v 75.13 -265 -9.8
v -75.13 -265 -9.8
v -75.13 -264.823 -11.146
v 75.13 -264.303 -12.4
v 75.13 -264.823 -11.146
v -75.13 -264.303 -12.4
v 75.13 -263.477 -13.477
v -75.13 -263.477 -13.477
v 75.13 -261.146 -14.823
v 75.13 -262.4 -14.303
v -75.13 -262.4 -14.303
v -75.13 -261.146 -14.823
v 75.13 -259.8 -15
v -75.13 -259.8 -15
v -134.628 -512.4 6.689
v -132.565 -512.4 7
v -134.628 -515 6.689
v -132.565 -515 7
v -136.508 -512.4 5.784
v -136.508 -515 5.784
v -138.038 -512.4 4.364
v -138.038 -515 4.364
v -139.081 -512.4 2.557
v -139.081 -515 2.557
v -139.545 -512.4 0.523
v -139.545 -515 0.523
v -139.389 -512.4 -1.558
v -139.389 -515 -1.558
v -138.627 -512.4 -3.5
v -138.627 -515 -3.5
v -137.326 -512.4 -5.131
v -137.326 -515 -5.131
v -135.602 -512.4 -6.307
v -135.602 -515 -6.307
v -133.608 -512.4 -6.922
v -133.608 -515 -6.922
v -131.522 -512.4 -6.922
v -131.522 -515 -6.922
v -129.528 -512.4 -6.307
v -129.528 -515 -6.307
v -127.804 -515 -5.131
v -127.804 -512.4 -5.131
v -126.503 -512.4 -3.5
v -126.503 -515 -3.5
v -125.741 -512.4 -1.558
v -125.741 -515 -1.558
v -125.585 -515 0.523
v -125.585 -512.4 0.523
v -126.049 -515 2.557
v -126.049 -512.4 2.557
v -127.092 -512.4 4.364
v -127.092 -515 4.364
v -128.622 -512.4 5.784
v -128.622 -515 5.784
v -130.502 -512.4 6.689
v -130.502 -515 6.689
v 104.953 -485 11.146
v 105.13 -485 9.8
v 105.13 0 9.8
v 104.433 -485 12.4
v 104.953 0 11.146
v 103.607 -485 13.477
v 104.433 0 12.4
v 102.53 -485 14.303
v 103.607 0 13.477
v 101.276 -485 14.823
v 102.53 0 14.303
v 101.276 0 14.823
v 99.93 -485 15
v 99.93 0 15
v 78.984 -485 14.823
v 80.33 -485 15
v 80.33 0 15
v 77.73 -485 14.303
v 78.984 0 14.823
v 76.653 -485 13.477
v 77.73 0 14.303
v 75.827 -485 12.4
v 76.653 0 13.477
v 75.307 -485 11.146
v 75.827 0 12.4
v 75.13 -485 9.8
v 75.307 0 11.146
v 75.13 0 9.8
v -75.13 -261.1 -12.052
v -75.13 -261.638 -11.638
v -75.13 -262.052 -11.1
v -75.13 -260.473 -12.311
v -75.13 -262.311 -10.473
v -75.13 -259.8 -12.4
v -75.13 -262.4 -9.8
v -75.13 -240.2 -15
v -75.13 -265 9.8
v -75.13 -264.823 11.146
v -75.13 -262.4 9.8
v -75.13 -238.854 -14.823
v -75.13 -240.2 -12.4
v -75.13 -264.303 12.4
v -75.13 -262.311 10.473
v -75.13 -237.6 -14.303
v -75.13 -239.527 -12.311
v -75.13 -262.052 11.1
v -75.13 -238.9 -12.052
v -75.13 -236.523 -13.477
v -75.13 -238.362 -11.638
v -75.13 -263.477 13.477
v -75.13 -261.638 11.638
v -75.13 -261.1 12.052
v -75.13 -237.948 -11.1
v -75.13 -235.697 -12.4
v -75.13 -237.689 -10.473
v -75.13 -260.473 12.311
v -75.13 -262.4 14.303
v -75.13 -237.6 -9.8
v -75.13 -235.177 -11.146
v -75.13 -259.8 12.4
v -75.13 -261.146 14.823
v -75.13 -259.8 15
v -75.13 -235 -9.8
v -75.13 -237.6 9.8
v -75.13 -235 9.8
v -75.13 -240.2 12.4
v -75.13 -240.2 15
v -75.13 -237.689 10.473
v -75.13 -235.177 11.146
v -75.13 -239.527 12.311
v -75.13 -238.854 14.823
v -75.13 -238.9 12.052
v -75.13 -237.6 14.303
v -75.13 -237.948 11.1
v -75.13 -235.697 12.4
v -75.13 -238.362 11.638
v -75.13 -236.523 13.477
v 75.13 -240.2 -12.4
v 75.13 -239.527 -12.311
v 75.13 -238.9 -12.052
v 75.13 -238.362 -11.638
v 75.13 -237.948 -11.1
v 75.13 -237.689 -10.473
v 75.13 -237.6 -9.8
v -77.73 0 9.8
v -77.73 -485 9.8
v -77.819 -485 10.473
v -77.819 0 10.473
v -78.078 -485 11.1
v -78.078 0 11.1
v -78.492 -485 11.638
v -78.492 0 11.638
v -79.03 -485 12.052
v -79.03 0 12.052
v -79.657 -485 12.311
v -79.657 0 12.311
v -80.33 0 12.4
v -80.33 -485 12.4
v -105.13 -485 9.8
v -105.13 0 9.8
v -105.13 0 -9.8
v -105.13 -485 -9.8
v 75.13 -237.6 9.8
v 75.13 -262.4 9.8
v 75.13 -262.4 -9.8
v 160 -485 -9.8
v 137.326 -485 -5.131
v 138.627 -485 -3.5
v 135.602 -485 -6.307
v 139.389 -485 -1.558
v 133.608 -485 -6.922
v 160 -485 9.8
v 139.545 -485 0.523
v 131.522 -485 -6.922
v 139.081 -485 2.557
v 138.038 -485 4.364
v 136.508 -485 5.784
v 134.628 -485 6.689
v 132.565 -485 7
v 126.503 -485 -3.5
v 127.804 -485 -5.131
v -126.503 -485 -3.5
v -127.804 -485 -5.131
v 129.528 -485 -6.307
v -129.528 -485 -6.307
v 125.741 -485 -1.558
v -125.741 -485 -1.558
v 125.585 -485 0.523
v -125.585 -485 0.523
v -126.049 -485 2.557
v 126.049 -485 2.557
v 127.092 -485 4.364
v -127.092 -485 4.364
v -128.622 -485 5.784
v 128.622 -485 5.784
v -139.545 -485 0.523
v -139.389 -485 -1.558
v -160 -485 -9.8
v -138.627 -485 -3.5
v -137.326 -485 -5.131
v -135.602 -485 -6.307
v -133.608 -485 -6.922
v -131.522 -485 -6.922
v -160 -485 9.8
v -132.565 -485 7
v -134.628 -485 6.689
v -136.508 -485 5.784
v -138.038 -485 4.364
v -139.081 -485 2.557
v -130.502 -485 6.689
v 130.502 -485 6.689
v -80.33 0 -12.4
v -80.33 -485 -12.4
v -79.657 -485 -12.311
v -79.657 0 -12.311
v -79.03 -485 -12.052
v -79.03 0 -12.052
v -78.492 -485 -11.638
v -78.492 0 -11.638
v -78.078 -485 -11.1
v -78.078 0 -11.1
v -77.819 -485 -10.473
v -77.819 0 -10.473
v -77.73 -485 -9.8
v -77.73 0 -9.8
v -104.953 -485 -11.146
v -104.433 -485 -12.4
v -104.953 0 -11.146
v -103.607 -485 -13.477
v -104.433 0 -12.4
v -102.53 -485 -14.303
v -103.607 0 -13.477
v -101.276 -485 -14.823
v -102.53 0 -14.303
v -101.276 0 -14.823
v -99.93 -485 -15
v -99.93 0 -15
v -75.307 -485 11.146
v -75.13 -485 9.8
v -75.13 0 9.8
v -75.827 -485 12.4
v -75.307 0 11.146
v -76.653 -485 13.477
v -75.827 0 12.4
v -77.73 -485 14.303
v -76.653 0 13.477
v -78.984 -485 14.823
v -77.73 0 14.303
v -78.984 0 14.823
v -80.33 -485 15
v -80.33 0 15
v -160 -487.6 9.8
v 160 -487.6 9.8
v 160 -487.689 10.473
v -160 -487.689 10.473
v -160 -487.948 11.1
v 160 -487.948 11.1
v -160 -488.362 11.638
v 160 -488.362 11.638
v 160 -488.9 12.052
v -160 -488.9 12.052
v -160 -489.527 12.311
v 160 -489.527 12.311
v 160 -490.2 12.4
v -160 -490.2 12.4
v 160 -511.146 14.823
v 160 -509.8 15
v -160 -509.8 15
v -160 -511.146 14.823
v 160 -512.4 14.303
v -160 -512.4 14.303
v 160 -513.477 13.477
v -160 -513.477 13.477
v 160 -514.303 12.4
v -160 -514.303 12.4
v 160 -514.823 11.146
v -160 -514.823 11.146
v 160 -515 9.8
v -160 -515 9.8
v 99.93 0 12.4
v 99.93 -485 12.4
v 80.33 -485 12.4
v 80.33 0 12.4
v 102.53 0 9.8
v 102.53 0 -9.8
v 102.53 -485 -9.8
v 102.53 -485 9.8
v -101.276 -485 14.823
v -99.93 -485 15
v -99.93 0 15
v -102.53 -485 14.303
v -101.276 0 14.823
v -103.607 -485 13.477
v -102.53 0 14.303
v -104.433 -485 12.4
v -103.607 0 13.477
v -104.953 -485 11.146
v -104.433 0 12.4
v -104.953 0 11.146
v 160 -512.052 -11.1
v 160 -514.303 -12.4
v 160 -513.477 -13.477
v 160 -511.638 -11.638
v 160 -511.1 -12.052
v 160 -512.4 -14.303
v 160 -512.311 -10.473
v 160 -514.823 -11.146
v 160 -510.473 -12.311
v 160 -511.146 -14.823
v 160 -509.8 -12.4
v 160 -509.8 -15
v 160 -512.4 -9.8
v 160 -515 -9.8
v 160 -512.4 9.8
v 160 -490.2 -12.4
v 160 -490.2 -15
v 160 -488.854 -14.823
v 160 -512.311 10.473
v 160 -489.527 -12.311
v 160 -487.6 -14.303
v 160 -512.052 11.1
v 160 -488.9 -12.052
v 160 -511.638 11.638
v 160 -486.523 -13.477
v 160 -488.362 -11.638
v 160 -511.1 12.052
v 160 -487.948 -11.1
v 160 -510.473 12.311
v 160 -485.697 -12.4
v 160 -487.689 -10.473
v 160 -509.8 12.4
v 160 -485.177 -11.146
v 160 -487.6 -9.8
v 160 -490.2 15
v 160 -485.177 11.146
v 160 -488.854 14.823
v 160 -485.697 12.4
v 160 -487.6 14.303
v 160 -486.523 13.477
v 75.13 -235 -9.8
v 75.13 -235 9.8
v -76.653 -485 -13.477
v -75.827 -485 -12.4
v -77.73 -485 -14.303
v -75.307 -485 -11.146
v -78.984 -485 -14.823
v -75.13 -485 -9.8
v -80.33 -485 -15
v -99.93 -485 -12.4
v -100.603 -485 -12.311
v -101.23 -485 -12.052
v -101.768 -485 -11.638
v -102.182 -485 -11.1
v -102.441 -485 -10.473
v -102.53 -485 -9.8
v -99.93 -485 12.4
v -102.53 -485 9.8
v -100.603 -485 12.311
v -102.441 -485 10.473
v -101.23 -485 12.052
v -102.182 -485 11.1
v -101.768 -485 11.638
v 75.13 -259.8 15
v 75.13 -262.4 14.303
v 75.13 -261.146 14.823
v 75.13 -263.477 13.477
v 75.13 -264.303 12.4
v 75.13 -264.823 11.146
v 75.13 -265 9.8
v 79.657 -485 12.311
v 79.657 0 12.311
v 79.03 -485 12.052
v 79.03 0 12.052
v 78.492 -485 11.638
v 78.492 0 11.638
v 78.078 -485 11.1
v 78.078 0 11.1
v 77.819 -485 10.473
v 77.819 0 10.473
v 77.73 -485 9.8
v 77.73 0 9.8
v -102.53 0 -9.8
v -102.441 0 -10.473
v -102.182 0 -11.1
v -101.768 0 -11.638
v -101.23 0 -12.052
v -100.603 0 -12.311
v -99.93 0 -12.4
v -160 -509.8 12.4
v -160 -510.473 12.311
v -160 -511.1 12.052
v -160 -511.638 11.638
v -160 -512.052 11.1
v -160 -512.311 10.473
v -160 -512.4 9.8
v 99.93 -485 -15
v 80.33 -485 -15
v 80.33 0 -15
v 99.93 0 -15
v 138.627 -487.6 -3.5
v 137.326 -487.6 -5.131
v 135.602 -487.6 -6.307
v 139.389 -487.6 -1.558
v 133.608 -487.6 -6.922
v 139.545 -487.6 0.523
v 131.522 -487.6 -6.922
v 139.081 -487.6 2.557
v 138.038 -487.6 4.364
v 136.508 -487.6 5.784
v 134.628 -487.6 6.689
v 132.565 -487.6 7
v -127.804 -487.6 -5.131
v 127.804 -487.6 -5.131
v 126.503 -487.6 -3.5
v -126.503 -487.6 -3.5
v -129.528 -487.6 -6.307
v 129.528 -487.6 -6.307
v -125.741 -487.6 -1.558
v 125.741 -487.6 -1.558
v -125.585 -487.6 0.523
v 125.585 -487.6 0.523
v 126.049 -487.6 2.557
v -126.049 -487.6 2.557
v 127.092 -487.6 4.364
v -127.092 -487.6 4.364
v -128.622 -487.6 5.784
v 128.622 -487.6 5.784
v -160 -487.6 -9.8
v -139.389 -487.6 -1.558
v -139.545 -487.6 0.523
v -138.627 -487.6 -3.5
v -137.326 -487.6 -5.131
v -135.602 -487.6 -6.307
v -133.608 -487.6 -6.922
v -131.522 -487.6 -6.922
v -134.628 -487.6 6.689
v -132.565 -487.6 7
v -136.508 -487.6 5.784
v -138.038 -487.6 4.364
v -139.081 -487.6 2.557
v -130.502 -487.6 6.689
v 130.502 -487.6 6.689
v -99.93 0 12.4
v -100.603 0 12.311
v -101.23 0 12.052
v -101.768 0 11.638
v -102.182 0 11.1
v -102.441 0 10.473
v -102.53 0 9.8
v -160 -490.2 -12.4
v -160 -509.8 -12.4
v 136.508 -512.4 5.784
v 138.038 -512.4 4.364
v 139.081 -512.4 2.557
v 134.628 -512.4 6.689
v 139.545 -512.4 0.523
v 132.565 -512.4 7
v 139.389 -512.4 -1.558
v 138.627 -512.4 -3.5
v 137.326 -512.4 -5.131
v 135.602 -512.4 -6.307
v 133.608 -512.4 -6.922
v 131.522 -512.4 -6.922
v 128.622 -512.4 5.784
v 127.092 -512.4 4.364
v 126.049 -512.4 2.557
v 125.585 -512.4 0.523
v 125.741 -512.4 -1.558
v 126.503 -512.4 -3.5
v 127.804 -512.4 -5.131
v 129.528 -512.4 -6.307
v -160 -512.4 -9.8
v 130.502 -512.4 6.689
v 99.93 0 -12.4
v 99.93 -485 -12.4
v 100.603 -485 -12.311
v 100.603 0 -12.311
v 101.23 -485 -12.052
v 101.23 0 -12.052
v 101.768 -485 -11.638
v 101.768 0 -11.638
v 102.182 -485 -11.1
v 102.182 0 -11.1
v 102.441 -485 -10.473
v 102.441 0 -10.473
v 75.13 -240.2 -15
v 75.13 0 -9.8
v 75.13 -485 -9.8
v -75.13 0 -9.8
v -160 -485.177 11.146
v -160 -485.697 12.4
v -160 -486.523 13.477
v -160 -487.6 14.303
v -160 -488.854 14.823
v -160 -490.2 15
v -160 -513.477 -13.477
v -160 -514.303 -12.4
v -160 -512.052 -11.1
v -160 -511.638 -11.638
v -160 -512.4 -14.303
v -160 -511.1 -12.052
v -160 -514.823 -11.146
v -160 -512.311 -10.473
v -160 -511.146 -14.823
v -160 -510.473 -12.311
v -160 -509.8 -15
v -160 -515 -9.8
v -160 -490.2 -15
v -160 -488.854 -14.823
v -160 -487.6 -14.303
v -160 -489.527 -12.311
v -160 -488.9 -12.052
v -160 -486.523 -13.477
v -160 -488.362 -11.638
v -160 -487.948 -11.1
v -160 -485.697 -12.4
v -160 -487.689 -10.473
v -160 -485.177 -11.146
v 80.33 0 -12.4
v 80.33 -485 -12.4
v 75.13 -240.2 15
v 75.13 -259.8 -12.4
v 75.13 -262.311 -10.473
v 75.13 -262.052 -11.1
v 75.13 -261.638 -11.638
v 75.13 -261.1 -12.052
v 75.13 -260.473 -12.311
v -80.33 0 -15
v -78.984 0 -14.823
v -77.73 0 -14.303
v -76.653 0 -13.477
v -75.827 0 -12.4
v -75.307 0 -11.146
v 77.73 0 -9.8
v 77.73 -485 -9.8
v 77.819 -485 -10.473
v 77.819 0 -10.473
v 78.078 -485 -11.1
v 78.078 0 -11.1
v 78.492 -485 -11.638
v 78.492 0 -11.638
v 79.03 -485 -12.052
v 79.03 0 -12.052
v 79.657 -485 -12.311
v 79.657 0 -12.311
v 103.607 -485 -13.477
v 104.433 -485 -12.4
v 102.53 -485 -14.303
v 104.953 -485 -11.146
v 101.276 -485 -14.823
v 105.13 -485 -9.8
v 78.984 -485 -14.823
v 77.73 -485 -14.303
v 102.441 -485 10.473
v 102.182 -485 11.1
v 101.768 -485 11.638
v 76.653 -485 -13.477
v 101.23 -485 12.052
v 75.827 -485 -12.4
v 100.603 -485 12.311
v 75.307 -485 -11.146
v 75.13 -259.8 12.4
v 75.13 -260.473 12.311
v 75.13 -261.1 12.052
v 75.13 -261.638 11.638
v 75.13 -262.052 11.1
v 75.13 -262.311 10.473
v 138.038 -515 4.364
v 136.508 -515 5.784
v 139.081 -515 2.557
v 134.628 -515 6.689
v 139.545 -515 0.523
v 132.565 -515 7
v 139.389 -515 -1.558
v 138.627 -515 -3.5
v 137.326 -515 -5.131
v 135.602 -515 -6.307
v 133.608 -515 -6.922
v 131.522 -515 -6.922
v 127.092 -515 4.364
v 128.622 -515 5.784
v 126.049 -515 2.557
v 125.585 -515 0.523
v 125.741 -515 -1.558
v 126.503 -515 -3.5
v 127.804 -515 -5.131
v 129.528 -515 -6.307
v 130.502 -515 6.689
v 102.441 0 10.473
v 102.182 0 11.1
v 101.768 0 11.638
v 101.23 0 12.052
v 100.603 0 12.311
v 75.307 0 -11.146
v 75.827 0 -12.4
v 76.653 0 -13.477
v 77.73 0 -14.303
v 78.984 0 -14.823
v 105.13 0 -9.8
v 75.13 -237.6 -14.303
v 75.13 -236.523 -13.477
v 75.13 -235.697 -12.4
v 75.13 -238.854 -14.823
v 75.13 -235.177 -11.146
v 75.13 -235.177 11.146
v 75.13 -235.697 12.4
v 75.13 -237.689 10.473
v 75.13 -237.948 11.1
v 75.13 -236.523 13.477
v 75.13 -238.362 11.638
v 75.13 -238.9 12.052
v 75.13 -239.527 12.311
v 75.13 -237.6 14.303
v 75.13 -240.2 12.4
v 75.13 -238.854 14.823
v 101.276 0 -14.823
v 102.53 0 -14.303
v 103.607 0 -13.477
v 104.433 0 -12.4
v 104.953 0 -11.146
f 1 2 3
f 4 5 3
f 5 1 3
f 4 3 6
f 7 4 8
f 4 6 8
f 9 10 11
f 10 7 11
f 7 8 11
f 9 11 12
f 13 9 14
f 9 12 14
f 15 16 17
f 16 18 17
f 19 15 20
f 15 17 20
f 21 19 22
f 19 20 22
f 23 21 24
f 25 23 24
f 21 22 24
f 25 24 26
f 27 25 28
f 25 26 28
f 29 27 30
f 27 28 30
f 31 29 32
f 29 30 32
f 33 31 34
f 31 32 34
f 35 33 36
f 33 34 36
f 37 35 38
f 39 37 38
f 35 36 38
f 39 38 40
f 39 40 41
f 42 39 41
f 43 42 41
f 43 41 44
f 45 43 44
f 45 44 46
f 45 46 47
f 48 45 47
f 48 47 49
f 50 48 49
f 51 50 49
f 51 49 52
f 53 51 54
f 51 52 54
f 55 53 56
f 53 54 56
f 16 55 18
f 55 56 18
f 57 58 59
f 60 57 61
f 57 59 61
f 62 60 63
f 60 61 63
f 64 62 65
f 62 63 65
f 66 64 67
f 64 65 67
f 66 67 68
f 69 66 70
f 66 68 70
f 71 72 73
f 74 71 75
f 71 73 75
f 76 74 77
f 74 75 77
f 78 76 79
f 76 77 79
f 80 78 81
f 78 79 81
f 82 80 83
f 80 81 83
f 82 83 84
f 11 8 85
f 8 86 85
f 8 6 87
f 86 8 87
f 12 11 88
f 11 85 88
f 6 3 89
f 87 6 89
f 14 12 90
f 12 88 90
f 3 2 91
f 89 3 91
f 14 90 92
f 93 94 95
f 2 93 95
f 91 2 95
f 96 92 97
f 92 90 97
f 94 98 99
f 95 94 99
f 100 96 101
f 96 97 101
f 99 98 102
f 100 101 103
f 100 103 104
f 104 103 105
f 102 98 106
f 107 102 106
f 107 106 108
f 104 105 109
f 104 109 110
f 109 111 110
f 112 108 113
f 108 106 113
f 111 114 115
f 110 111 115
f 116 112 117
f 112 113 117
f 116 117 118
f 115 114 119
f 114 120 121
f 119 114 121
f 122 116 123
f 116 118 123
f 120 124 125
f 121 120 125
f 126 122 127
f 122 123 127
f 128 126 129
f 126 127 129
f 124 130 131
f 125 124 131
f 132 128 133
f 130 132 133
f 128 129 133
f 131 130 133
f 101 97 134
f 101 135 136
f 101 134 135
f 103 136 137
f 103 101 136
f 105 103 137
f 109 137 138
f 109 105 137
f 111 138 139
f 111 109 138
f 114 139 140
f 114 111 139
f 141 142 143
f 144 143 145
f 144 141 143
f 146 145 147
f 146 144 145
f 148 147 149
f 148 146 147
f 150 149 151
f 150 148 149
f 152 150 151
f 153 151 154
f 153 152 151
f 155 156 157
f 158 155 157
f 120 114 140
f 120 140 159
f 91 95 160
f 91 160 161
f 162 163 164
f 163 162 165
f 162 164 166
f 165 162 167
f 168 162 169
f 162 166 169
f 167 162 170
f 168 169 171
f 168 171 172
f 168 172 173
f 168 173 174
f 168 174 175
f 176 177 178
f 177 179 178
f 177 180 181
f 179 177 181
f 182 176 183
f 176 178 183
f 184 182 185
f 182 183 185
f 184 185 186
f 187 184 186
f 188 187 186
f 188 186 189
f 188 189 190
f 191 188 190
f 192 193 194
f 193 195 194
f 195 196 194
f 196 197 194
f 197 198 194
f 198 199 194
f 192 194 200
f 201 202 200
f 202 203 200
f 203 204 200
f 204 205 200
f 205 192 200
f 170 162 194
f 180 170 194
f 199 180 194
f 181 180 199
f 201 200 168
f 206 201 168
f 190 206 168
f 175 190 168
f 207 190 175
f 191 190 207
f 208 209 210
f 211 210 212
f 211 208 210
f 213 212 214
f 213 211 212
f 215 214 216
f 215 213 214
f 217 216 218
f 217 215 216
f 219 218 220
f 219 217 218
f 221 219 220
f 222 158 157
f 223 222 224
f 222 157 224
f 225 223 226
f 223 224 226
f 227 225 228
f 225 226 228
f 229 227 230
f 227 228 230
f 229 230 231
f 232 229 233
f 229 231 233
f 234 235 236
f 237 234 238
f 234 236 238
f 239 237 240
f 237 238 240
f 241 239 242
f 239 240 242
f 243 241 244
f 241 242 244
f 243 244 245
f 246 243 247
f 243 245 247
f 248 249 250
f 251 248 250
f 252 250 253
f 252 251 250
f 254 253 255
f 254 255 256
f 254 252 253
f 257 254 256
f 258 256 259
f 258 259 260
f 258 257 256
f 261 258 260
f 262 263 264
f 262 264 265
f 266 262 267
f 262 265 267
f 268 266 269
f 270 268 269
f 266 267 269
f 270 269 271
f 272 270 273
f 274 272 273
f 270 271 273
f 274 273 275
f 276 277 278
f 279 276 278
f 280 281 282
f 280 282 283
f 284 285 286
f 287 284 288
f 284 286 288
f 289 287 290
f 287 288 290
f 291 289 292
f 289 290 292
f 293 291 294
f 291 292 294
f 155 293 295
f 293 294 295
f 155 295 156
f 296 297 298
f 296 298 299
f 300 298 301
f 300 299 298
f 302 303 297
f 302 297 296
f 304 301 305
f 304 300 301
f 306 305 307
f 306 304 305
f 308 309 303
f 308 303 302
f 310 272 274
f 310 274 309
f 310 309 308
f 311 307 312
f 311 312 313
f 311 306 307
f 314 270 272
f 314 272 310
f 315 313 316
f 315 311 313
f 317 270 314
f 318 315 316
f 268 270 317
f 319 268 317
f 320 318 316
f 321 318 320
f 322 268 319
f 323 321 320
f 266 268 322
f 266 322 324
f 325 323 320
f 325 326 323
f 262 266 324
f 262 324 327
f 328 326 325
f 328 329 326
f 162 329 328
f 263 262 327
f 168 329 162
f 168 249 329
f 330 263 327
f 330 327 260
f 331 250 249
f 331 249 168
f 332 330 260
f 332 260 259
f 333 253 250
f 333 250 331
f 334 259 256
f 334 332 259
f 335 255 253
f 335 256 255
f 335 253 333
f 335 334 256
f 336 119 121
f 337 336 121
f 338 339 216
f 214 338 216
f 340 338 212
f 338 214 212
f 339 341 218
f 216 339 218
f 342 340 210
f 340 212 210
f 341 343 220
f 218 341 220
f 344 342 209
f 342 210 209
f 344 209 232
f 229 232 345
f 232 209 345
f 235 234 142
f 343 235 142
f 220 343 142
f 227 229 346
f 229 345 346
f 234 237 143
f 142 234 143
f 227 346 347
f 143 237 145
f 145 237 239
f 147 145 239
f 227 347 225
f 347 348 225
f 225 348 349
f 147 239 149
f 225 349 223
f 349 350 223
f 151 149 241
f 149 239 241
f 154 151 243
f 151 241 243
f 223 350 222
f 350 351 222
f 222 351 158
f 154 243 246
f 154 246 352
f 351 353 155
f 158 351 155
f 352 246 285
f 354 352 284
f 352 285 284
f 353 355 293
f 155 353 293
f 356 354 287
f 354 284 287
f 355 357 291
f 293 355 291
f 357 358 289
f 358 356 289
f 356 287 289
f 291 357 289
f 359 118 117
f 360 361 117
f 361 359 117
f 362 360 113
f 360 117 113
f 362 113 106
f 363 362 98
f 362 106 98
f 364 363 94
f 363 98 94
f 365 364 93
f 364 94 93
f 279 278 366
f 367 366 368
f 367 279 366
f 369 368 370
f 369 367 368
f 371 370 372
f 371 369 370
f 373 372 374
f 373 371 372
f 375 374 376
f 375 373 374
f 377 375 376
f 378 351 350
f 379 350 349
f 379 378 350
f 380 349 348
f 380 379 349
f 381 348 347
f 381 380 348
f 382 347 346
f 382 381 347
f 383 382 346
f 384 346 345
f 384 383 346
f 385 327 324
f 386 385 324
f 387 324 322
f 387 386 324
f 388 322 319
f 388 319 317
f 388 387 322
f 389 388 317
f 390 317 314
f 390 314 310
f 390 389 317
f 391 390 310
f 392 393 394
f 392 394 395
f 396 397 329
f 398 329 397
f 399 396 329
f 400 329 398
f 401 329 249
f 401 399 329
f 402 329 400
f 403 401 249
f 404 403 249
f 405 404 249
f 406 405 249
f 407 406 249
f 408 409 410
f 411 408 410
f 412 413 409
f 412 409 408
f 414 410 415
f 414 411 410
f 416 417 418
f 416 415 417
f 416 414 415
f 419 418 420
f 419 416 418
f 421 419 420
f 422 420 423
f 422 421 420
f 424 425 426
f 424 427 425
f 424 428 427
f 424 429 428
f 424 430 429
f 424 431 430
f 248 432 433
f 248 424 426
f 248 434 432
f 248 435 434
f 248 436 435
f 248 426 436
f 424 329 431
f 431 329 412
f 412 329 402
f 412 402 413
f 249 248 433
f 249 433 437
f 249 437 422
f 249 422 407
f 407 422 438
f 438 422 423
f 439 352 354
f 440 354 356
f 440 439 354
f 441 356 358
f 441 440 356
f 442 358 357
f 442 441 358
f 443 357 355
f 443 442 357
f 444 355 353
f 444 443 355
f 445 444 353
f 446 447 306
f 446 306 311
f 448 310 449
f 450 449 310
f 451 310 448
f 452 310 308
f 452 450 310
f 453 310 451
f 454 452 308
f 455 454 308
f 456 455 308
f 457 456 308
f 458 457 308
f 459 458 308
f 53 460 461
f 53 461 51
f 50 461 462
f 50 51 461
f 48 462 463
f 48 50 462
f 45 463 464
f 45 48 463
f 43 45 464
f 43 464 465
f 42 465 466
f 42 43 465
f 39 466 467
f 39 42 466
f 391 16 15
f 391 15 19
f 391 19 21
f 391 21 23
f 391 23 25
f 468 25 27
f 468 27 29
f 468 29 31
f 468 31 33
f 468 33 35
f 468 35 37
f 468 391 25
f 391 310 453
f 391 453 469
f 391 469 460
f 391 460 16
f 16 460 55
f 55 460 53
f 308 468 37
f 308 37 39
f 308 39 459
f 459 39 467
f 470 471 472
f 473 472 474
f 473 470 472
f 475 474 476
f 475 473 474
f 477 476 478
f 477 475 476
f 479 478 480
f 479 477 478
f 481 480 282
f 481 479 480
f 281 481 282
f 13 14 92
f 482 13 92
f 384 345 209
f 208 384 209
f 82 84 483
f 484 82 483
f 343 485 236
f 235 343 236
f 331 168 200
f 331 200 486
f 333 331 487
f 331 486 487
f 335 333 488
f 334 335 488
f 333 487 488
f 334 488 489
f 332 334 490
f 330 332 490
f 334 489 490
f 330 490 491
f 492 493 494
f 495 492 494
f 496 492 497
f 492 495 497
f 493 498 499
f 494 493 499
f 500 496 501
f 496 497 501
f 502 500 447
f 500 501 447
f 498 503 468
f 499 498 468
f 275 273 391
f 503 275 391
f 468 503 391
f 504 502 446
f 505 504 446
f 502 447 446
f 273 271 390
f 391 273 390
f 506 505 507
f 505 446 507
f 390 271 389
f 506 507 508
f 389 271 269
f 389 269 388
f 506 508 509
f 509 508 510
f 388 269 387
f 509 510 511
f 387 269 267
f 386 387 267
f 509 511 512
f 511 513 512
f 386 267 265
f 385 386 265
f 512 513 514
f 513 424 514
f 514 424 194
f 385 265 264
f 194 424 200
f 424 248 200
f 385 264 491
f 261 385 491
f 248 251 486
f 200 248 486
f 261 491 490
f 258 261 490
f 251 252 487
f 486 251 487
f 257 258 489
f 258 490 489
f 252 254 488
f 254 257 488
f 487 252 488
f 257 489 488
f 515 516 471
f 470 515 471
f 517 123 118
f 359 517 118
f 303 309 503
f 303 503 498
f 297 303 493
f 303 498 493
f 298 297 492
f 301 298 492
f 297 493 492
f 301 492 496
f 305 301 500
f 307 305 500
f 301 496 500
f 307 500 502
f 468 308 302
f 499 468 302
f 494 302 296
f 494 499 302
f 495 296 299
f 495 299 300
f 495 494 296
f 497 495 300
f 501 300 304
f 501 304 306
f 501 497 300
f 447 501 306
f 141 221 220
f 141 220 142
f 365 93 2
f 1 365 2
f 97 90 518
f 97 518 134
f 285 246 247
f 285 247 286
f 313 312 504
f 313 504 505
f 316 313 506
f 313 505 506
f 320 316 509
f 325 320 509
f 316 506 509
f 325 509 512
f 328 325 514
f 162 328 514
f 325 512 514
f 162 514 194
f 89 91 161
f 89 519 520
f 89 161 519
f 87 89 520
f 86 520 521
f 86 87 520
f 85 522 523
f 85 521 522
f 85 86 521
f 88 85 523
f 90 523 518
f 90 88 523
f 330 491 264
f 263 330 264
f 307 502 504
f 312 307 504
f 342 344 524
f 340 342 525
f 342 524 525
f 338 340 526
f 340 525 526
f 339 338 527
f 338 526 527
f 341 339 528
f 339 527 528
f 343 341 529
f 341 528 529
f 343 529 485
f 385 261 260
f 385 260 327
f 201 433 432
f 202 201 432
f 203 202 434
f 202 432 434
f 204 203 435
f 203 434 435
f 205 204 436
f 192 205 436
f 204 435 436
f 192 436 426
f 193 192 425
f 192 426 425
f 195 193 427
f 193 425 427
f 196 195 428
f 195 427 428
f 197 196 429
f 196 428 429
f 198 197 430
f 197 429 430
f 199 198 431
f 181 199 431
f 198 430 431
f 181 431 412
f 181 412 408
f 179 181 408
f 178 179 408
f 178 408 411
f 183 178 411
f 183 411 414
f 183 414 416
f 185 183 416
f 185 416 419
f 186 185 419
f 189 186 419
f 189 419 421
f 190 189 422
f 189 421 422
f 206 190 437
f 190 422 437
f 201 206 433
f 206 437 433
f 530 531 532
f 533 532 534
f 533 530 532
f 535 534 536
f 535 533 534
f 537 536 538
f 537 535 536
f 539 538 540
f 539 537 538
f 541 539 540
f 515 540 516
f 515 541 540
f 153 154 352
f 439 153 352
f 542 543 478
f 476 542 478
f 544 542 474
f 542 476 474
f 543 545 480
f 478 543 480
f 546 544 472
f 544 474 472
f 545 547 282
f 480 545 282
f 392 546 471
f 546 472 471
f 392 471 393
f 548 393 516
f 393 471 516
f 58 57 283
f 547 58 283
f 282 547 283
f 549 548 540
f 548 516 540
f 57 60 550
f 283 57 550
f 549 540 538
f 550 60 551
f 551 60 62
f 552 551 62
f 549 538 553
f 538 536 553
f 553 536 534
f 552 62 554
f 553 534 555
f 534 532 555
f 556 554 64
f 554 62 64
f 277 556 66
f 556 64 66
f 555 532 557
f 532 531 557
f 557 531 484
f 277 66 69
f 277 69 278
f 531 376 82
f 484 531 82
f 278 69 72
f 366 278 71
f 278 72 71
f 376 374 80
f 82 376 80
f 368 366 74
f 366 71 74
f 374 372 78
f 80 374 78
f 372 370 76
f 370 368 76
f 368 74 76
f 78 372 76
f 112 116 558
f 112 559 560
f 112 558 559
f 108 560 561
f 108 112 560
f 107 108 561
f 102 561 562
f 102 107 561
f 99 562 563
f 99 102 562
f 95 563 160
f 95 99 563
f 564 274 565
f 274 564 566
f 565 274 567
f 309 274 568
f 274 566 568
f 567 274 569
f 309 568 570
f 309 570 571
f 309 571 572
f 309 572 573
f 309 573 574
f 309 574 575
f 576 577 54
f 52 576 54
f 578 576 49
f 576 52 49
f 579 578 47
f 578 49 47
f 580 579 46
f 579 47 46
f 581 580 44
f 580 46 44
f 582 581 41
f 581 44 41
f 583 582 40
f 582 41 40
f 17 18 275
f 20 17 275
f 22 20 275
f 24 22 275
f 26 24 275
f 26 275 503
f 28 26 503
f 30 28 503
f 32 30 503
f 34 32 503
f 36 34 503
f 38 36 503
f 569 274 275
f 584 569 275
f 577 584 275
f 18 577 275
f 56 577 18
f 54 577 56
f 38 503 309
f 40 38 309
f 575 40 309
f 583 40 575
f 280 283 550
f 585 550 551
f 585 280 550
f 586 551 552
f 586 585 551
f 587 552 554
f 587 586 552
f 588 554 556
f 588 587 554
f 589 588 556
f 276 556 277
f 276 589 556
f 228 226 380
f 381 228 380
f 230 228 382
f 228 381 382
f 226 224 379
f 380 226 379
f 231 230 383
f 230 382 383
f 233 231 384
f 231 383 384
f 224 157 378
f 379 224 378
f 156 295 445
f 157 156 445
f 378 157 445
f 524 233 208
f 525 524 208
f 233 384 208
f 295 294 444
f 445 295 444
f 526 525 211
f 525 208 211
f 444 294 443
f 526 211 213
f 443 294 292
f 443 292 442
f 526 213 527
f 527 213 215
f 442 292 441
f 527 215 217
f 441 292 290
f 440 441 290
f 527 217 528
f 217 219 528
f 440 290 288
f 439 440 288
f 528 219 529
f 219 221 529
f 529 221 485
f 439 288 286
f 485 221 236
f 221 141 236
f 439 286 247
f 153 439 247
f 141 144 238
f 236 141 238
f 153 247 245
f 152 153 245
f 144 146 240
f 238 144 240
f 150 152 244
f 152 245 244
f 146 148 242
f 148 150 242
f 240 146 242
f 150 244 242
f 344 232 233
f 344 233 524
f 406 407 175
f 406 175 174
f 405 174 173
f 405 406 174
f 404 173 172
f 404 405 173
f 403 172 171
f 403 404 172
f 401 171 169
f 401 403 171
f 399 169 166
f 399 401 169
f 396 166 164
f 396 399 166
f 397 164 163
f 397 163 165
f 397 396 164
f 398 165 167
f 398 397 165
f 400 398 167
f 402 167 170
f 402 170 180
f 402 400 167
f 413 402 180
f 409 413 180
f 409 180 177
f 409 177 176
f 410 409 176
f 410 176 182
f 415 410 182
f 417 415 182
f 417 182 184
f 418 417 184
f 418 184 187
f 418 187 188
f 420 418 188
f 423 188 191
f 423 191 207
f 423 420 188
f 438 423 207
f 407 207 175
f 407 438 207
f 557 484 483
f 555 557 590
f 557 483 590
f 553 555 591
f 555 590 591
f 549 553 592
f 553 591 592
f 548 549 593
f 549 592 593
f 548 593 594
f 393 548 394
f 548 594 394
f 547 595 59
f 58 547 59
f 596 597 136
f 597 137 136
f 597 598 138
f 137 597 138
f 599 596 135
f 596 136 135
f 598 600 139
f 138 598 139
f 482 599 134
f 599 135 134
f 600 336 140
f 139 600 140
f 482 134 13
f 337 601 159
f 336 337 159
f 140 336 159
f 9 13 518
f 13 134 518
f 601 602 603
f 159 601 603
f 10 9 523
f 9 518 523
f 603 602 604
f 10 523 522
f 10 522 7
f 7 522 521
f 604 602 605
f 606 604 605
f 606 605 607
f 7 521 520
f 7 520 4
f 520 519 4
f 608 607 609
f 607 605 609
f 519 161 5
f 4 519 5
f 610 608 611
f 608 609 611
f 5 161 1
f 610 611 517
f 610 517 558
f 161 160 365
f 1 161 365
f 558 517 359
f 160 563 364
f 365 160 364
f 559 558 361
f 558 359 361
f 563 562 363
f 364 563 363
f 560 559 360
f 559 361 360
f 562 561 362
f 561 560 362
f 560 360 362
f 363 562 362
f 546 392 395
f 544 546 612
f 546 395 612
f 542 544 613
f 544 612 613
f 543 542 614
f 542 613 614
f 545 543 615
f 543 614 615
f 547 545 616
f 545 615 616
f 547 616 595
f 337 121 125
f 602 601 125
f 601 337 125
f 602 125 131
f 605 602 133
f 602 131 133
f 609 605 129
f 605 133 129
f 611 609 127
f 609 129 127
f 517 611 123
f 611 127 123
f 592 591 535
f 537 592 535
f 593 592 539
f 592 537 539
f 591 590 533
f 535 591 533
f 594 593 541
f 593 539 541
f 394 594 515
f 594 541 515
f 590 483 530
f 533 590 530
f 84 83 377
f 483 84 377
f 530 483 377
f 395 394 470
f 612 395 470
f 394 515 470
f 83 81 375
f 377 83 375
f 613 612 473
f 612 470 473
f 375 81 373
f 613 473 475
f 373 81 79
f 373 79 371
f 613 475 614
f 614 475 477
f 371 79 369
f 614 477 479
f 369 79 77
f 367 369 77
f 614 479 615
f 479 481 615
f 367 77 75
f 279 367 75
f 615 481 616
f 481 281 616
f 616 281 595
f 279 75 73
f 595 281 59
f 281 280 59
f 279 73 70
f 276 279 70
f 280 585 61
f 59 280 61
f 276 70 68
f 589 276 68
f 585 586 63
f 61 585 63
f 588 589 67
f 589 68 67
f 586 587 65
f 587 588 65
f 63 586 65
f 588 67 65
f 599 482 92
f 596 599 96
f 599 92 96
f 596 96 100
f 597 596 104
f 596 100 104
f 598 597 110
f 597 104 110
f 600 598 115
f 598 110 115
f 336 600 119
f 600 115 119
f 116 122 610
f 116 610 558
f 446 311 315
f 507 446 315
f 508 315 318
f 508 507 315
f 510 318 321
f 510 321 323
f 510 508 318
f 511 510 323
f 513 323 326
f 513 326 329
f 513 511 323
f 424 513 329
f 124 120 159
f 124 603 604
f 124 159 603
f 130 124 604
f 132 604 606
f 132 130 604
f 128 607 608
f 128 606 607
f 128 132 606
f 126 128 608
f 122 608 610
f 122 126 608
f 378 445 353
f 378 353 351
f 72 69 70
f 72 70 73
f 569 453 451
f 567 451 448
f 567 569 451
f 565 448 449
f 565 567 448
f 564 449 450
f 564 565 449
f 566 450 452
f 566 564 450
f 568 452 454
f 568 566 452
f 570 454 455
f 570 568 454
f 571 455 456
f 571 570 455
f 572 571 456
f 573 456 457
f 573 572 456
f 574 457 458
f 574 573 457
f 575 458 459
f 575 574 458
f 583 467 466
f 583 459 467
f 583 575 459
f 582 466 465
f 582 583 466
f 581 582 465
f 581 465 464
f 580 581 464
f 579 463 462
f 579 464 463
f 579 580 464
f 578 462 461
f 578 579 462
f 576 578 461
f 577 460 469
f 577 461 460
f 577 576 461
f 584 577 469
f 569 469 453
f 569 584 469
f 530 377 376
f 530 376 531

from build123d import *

# Parameters (mm, degrees)
SQUARE_TUBE_CONFIGURED_30_X_30_X_2_6_1_DEPTH = 501
SQUARE_TUBE_CONFIGURED_30_X_30_X_2_3_DEPTH   = 501
SQUARE_TUBE_CONFIGURED_30_X_30_X_2_4_DEPTH   = 320
SQUARE_TUBE_CONFIGURED_30_X_30_X_2_5_DEPTH   = 182.26
IZIM9_W                                      = 7
IZIM9_H                                      = 30


with BuildPart() as part:
    # Sketch1 → Square tube - configured 30 X 30 X 2.6(1) (new body)
    with BuildSketch(Plane(origin=(-90.13, 0, 0), x_dir=(1, 0, 0), z_dir=(0, -1, 0))):
        with BuildLine():
            Line((-9.8, -15), (9.8, -15))
            ThreePointArc((9.8, -15), (13.476955262, -13.476955262), (15, -9.8))
            Line((15, -9.8), (15, 9.8))
            ThreePointArc((15, 9.8), (13.476955262, 13.476955262), (9.8, 15))
            Line((9.8, 15), (-9.8, 15))
            ThreePointArc((-9.8, 15), (-13.476955262, 13.476955262), (-15, 9.8))
            Line((-15, 9.8), (-15, -9.8))
            ThreePointArc((-15, -9.8), (-13.476955262, -13.476955262), (-9.8, -15))
        make_face()
        with BuildLine():
            Line((-9.8, -12.4), (9.8, -12.4))
            ThreePointArc((9.8, -12.4), (11.638477631, -11.638477631), (12.4, -9.8))
            Line((12.4, -9.8), (12.4, 9.8))
            ThreePointArc((12.4, 9.8), (11.638477631, 11.638477631), (9.8, 12.4))
            Line((9.8, 12.4), (-9.8, 12.4))
            ThreePointArc((-9.8, 12.4), (-11.638477631, 11.638477631), (-12.4, 9.8))
            Line((-12.4, 9.8), (-12.4, -9.8))
            ThreePointArc((-12.4, -9.8), (-11.638477631, -11.638477631), (-9.8, -12.4))
        make_face(mode=Mode.SUBTRACT)
    extrude(amount=SQUARE_TUBE_CONFIGURED_30_X_30_X_2_6_1_DEPTH)

    # Square tube - configured 30 X 30 X 2 2
    split(bisect_by=Plane(origin=(-90.13, -485, 0), x_dir=(-1, 0, 0), z_dir=(0, 1, 0)), keep=Keep.TOP)


with BuildPart() as body_2:
    # Sketch1 on segment 2 (carried to segment 2) → Square tube - configured 30 X 30 X 2 3 (new body)
    with BuildSketch(Plane(origin=(90.13, 0, 0), x_dir=(1, 0, 0), z_dir=(0, -1, 0))):
        with BuildLine():
            Line((-9.8, -15), (9.8, -15))
            ThreePointArc((9.8, -15), (13.476955262, -13.476955262), (15, -9.8))
            Line((15, -9.8), (15, 9.8))
            ThreePointArc((15, 9.8), (13.476955262, 13.476955262), (9.8, 15))
            Line((9.8, 15), (-9.8, 15))
            ThreePointArc((-9.8, 15), (-13.476955262, 13.476955262), (-15, 9.8))
            Line((-15, 9.8), (-15, -9.8))
            ThreePointArc((-15, -9.8), (-13.476955262, -13.476955262), (-9.8, -15))
        make_face()
        with BuildLine():
            Line((-9.8, -12.4), (9.8, -12.4))
            ThreePointArc((9.8, -12.4), (11.638477631, -11.638477631), (12.4, -9.8))
            Line((12.4, -9.8), (12.4, 9.8))
            ThreePointArc((12.4, 9.8), (11.638477631, 11.638477631), (9.8, 12.4))
            Line((9.8, 12.4), (-9.8, 12.4))
            ThreePointArc((-9.8, 12.4), (-11.638477631, 11.638477631), (-12.4, 9.8))
            Line((-12.4, 9.8), (-12.4, -9.8))
            ThreePointArc((-12.4, -9.8), (-11.638477631, -11.638477631), (-9.8, -12.4))
        make_face(mode=Mode.SUBTRACT)
    extrude(amount=SQUARE_TUBE_CONFIGURED_30_X_30_X_2_3_DEPTH)

    # Square tube - configured 30 X 30 X 2 3 e
    split(bisect_by=Plane(origin=(90.13, -485, 0), x_dir=(-1, 0, 0), z_dir=(0, 1, 0)), keep=Keep.TOP)


with BuildPart() as body_3:
    # Sketch1 on segment 3 (carried to segment 3) → Square tube - configured 30 X 30 X 2 4 (new body)
    with BuildSketch(Plane(origin=(-160, -500, 0), x_dir=(0, 1, 0), z_dir=(1, 0, 0))):
        with BuildLine():
            Line((-9.8, -15), (9.8, -15))
            ThreePointArc((9.8, -15), (13.476955262, -13.476955262), (15, -9.8))
            Line((15, -9.8), (15, 9.8))
            ThreePointArc((15, 9.8), (13.476955262, 13.476955262), (9.8, 15))
            Line((9.8, 15), (-9.8, 15))
            ThreePointArc((-9.8, 15), (-13.476955262, 13.476955262), (-15, 9.8))
            Line((-15, 9.8), (-15, -9.8))
            ThreePointArc((-15, -9.8), (-13.476955262, -13.476955262), (-9.8, -15))
        make_face()
        with BuildLine():
            Line((-9.8, -12.4), (9.8, -12.4))
            ThreePointArc((9.8, -12.4), (11.638477631, -11.638477631), (12.4, -9.8))
            Line((12.4, -9.8), (12.4, 9.8))
            ThreePointArc((12.4, 9.8), (11.638477631, 11.638477631), (9.8, 12.4))
            Line((9.8, 12.4), (-9.8, 12.4))
            ThreePointArc((-9.8, 12.4), (-11.638477631, 11.638477631), (-12.4, 9.8))
            Line((-12.4, 9.8), (-12.4, -9.8))
            ThreePointArc((-12.4, -9.8), (-11.638477631, -11.638477631), (-9.8, -12.4))
        make_face(mode=Mode.SUBTRACT)
    extrude(amount=SQUARE_TUBE_CONFIGURED_30_X_30_X_2_4_DEPTH)

    # Çizim9 → M16 Dişli Delik1 (revolve, cut)
    with BuildSketch(Plane(origin=(-132.565, -485, 0), x_dir=(0, 0, 1), z_dir=(1, 0, 0))):
        with Locations((3.5, 15)):
            Rectangle(IZIM9_W, IZIM9_H)
    m16_di_li_delik1 = revolve(axis=Axis((-132.565, -478.65, 0), (0, -1, 0)), mode=Mode.SUBTRACT)

    # Aynalama1: M16 Dişli Delik1 across plane
    add(m16_di_li_delik1.mirror(Plane(origin=(0, 0, 0), x_dir=(0, 0, 1), z_dir=(1, 0, 0))), mode=Mode.SUBTRACT)


with BuildPart() as body_4:
    # Sketch1 on segment 4 (carried to segment 4) → Square tube - configured 30 X 30 X 2 5 (new body)
    with BuildSketch(Plane(origin=(-91.13, -250, 0), x_dir=(0, 1, 0), z_dir=(1, 0, 0))):
        with BuildLine():
            Line((-9.8, -15), (9.8, -15))
            ThreePointArc((9.8, -15), (13.476955262, -13.476955262), (15, -9.8))
            Line((15, -9.8), (15, 9.8))
            ThreePointArc((15, 9.8), (13.476955262, 13.476955262), (9.8, 15))
            Line((9.8, 15), (-9.8, 15))
            ThreePointArc((-9.8, 15), (-13.476955262, 13.476955262), (-15, 9.8))
            Line((-15, 9.8), (-15, -9.8))
            ThreePointArc((-15, -9.8), (-13.476955262, -13.476955262), (-9.8, -15))
        make_face()
        with BuildLine():
            Line((-9.8, -12.4), (9.8, -12.4))
            ThreePointArc((9.8, -12.4), (11.638477631, -11.638477631), (12.4, -9.8))
            Line((12.4, -9.8), (12.4, 9.8))
            ThreePointArc((12.4, 9.8), (11.638477631, 11.638477631), (9.8, 12.4))
            Line((9.8, 12.4), (-9.8, 12.4))
            ThreePointArc((-9.8, 12.4), (-11.638477631, 11.638477631), (-12.4, 9.8))
            Line((-12.4, 9.8), (-12.4, -9.8))
            ThreePointArc((-12.4, -9.8), (-11.638477631, -11.638477631), (-9.8, -12.4))
        make_face(mode=Mode.SUBTRACT)
    extrude(amount=SQUARE_TUBE_CONFIGURED_30_X_30_X_2_5_DEPTH)

    # Square tube - configured 30 X 30 X 2 5 e
    split(bisect_by=Plane(origin=(-75.13, -250, 0), x_dir=(0, 1, 0), z_dir=(1, 0, 0)), keep=Keep.TOP)

    # Square tube - configured 30 X 30 X 2 6
    split(bisect_by=Plane(origin=(75.13, -250, 0), x_dir=(0, -1, 0), z_dir=(-1, 0, 0)), keep=Keep.TOP)


solid = Compound([part.part, body_2.part, body_3.part, body_4.part])
